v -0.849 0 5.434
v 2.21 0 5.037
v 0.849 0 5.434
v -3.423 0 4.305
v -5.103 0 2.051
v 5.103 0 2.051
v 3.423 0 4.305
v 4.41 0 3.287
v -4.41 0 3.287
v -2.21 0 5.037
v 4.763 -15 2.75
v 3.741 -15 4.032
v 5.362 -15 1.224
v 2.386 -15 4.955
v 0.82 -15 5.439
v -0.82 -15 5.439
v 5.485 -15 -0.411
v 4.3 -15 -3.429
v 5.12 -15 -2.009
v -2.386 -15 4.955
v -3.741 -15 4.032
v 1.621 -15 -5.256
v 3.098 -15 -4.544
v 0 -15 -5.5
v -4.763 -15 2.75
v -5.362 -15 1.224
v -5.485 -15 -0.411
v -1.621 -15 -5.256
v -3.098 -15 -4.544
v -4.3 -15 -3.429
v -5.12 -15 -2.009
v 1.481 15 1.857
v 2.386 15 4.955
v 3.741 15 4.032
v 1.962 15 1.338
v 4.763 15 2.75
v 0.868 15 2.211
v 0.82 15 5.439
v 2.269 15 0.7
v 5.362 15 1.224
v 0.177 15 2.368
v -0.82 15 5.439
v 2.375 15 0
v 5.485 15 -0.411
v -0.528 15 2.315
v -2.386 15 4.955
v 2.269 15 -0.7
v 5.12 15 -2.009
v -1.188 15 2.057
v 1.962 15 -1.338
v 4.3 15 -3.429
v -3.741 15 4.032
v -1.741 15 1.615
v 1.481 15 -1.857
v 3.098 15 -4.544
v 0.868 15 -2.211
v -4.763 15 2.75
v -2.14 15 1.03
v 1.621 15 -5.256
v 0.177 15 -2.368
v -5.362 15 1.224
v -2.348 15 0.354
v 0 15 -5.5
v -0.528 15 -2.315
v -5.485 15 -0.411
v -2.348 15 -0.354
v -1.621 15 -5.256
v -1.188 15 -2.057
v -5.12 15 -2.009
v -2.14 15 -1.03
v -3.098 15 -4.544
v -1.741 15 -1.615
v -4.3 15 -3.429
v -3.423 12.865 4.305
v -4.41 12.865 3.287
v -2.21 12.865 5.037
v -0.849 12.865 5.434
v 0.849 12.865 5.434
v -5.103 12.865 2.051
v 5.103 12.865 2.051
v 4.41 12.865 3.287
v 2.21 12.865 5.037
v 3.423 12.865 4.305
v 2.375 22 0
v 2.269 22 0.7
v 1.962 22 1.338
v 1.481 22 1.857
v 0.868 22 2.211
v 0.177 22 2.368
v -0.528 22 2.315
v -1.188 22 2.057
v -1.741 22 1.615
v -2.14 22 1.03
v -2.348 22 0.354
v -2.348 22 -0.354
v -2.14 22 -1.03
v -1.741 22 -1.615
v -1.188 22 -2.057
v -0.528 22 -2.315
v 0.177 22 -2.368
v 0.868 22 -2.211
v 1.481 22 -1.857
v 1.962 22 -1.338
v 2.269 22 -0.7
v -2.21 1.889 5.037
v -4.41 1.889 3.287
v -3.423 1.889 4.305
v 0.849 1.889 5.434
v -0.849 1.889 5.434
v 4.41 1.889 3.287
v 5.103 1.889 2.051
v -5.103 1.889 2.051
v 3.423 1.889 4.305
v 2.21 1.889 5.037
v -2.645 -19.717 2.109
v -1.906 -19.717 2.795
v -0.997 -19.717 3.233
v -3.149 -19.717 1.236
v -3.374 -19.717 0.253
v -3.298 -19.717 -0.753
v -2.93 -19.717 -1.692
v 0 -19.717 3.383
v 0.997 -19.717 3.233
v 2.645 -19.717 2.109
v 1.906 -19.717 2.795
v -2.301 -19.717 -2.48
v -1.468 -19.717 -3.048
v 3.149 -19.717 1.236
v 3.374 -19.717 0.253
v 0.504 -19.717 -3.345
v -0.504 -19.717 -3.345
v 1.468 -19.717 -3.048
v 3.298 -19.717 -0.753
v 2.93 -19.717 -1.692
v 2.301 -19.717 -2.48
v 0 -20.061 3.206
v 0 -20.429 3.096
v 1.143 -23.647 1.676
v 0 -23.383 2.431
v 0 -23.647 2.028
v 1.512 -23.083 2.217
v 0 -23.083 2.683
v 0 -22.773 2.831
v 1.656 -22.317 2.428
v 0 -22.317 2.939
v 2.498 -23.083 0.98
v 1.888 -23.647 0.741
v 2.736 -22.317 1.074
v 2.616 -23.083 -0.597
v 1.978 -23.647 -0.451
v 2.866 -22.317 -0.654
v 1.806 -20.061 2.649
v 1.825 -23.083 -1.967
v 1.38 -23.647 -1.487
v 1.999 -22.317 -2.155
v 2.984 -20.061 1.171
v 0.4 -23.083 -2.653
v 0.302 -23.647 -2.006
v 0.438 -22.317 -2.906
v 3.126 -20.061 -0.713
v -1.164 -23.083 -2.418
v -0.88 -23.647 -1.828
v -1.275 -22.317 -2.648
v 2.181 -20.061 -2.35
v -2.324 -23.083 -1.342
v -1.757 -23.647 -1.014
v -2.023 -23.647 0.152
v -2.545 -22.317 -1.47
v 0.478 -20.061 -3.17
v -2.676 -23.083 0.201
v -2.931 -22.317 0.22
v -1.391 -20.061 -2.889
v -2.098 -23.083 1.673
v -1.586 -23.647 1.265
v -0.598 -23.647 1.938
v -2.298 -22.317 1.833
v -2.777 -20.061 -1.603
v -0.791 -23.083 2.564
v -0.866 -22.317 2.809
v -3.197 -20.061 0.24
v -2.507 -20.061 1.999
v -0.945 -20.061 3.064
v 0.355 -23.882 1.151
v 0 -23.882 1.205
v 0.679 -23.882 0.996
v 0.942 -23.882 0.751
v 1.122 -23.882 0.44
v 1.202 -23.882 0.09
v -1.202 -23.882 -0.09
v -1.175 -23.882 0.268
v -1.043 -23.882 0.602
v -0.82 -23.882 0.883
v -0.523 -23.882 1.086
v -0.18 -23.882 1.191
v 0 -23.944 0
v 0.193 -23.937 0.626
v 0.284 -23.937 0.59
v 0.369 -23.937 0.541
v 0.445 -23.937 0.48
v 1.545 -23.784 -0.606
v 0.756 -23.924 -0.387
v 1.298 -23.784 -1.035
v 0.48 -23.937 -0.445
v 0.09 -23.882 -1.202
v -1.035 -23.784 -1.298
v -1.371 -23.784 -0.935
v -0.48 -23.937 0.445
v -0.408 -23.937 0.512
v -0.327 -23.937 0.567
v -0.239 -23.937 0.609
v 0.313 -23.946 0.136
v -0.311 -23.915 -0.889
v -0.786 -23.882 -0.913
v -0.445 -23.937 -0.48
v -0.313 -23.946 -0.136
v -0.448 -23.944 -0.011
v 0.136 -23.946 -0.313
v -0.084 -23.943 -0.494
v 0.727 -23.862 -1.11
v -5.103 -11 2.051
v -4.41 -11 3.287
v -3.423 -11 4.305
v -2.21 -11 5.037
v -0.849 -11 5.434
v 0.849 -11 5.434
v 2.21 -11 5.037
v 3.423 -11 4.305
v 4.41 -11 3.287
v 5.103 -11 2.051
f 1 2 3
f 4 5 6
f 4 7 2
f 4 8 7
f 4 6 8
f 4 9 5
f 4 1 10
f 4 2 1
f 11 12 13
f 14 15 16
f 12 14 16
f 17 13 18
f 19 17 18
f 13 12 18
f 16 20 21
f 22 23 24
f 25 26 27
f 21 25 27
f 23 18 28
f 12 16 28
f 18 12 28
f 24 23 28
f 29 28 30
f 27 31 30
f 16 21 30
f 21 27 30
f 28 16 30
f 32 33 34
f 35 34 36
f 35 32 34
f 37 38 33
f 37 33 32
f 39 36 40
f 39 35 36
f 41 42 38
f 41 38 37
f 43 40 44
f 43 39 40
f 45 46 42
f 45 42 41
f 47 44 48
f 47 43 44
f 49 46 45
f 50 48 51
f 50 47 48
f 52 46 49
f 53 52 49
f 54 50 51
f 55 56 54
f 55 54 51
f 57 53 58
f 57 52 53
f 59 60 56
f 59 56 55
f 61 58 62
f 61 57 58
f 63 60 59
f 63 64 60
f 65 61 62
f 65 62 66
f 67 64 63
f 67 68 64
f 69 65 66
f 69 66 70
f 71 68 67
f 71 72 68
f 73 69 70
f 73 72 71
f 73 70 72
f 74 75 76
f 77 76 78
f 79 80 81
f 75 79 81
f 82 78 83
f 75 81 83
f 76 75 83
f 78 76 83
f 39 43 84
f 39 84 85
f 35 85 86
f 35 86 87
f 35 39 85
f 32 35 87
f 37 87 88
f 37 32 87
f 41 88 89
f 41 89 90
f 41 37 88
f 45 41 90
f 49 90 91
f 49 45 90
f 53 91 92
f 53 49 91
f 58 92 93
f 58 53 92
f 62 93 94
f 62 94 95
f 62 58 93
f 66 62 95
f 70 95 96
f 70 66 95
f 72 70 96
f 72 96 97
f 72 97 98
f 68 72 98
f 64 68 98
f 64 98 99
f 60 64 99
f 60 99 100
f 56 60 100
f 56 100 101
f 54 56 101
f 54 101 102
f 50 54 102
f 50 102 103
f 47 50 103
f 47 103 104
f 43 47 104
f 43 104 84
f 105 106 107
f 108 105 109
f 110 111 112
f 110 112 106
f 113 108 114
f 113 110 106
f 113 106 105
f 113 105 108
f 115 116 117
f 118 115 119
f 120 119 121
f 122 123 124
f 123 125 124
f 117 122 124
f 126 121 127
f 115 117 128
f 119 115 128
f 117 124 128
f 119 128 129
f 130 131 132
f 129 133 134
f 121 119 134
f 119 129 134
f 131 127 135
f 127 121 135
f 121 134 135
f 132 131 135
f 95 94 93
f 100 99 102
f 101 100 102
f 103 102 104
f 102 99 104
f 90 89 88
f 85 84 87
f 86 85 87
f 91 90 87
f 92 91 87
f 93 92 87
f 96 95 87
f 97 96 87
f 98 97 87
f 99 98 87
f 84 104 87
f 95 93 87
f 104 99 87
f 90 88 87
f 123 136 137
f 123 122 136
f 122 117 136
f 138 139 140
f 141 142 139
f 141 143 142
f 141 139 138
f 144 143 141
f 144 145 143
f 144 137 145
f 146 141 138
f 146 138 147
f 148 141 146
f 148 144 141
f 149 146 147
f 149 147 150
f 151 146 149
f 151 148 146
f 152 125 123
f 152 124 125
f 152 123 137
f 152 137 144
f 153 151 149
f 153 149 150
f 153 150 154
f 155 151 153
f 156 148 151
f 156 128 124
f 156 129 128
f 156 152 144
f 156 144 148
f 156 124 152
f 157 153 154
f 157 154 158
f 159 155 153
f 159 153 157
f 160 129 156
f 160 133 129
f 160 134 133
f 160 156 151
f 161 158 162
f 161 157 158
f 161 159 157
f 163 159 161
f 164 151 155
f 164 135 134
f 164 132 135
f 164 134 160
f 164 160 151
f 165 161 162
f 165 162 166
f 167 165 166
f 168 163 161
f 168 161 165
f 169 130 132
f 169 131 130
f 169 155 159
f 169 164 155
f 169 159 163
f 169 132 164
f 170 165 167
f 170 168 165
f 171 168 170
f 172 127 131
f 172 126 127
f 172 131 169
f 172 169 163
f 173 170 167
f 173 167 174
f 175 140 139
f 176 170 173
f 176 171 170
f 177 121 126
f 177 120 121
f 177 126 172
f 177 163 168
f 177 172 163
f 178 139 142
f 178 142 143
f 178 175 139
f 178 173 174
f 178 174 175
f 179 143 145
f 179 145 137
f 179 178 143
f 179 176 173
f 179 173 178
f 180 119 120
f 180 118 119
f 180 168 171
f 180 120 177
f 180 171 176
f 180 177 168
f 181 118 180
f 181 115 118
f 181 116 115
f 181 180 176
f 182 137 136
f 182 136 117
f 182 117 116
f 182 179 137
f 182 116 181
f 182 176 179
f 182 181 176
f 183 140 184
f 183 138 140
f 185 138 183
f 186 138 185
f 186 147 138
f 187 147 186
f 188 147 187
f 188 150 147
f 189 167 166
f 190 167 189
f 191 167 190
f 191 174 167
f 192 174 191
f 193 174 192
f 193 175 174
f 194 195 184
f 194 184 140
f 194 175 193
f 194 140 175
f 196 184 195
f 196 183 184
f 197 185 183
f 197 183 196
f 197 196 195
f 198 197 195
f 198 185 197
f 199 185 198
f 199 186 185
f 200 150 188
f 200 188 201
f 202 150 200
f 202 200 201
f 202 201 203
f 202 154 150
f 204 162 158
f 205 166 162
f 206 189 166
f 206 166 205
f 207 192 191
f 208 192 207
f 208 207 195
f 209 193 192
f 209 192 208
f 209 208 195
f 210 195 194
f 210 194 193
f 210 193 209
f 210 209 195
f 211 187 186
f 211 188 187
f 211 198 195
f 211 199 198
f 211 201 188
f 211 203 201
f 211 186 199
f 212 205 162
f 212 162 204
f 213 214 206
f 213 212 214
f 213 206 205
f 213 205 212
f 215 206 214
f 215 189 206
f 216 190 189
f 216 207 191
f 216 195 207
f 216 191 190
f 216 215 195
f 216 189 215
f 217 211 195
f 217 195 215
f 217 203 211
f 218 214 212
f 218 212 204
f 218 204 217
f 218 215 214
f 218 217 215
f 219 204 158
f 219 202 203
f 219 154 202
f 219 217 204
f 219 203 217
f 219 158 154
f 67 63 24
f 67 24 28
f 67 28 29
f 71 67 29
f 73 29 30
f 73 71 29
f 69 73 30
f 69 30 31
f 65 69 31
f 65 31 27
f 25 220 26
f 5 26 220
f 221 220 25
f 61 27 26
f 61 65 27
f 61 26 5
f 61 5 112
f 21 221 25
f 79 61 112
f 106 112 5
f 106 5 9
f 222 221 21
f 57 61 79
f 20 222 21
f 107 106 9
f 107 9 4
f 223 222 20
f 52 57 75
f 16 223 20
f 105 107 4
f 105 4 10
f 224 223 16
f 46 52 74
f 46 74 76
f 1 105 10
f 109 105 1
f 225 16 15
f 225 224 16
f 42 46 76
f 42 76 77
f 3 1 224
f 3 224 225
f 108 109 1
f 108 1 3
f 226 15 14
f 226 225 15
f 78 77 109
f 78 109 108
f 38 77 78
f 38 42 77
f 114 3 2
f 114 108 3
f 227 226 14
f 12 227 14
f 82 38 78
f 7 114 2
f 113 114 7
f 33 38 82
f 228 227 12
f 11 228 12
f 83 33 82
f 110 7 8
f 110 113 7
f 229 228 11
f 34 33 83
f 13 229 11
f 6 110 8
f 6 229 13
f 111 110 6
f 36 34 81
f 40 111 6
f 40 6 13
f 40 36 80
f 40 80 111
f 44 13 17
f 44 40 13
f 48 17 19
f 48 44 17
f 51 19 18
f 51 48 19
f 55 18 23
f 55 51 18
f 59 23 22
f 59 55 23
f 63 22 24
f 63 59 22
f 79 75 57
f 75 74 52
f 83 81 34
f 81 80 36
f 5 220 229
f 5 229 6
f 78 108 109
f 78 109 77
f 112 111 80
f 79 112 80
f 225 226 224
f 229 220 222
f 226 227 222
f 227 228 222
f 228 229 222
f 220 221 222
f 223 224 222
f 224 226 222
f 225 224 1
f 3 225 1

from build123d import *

# Parameters (mm, degrees)
F0_W     = 30
F0_H     = 5.5
F2_R     = 2.375
F3_DEPTH = 22
F6_W     = 11
F6_H     = 3.3831604108
F6_W_2   = 10.9763208394
F7_DEPTH = 12.5


with BuildPart() as f1:
    # F0 (on Right) → F1 (revolve)
    with BuildSketch(Plane.YZ):
        with Locations((0, -2.75)):
            Rectangle(F0_W, F0_H)
    revolve(axis=Axis((0, -0.666433014, 0), (0, 1, 0)))

    # F2 (on Front) → F3 (join)
    with BuildSketch(Plane.XZ):
        Circle(F2_R)
    extrude(amount=-F3_DEPTH)

    # F6 (on Right) → F7 (cut, symmetric)
    with BuildSketch(Plane.YZ):
        with Locations((-5.5, 3.7424566898)):
            Rectangle(F6_W, F6_H)
        with Locations((7.3770062923, 3.7424566898)):
            Rectangle(F6_W_2, F6_H)
    extrude(amount=F7_DEPTH, both=True, mode=Mode.SUBTRACT)


with BuildPart() as f5:
    # F4 (on Right) → F5 (revolve)
    with BuildSketch(Plane.YZ):
        with BuildLine():
            Line((-19.7167880833, 0), (-19.7167880833, 3.3832169138))
            add(Edge.make_bspline(
                [(-23.9435881376, 0), (-24.0535903722, 4.3109175749), (-21.3206969202, 2.3273658007), (-19.7167880833, 3.3832169138)],
                knots=[0, 0, 0, 0, 5.4140553548, 5.4140553548, 5.4140553548, 5.4140553548], degree=3))
            Line((-23.9435881376, 0), (-19.7167880833, 0))
        make_face()
    revolve(axis=Axis((0, -0.666433014, 0), (0, 1, 0)))


solid = Compound([f1.part, f5.part])
